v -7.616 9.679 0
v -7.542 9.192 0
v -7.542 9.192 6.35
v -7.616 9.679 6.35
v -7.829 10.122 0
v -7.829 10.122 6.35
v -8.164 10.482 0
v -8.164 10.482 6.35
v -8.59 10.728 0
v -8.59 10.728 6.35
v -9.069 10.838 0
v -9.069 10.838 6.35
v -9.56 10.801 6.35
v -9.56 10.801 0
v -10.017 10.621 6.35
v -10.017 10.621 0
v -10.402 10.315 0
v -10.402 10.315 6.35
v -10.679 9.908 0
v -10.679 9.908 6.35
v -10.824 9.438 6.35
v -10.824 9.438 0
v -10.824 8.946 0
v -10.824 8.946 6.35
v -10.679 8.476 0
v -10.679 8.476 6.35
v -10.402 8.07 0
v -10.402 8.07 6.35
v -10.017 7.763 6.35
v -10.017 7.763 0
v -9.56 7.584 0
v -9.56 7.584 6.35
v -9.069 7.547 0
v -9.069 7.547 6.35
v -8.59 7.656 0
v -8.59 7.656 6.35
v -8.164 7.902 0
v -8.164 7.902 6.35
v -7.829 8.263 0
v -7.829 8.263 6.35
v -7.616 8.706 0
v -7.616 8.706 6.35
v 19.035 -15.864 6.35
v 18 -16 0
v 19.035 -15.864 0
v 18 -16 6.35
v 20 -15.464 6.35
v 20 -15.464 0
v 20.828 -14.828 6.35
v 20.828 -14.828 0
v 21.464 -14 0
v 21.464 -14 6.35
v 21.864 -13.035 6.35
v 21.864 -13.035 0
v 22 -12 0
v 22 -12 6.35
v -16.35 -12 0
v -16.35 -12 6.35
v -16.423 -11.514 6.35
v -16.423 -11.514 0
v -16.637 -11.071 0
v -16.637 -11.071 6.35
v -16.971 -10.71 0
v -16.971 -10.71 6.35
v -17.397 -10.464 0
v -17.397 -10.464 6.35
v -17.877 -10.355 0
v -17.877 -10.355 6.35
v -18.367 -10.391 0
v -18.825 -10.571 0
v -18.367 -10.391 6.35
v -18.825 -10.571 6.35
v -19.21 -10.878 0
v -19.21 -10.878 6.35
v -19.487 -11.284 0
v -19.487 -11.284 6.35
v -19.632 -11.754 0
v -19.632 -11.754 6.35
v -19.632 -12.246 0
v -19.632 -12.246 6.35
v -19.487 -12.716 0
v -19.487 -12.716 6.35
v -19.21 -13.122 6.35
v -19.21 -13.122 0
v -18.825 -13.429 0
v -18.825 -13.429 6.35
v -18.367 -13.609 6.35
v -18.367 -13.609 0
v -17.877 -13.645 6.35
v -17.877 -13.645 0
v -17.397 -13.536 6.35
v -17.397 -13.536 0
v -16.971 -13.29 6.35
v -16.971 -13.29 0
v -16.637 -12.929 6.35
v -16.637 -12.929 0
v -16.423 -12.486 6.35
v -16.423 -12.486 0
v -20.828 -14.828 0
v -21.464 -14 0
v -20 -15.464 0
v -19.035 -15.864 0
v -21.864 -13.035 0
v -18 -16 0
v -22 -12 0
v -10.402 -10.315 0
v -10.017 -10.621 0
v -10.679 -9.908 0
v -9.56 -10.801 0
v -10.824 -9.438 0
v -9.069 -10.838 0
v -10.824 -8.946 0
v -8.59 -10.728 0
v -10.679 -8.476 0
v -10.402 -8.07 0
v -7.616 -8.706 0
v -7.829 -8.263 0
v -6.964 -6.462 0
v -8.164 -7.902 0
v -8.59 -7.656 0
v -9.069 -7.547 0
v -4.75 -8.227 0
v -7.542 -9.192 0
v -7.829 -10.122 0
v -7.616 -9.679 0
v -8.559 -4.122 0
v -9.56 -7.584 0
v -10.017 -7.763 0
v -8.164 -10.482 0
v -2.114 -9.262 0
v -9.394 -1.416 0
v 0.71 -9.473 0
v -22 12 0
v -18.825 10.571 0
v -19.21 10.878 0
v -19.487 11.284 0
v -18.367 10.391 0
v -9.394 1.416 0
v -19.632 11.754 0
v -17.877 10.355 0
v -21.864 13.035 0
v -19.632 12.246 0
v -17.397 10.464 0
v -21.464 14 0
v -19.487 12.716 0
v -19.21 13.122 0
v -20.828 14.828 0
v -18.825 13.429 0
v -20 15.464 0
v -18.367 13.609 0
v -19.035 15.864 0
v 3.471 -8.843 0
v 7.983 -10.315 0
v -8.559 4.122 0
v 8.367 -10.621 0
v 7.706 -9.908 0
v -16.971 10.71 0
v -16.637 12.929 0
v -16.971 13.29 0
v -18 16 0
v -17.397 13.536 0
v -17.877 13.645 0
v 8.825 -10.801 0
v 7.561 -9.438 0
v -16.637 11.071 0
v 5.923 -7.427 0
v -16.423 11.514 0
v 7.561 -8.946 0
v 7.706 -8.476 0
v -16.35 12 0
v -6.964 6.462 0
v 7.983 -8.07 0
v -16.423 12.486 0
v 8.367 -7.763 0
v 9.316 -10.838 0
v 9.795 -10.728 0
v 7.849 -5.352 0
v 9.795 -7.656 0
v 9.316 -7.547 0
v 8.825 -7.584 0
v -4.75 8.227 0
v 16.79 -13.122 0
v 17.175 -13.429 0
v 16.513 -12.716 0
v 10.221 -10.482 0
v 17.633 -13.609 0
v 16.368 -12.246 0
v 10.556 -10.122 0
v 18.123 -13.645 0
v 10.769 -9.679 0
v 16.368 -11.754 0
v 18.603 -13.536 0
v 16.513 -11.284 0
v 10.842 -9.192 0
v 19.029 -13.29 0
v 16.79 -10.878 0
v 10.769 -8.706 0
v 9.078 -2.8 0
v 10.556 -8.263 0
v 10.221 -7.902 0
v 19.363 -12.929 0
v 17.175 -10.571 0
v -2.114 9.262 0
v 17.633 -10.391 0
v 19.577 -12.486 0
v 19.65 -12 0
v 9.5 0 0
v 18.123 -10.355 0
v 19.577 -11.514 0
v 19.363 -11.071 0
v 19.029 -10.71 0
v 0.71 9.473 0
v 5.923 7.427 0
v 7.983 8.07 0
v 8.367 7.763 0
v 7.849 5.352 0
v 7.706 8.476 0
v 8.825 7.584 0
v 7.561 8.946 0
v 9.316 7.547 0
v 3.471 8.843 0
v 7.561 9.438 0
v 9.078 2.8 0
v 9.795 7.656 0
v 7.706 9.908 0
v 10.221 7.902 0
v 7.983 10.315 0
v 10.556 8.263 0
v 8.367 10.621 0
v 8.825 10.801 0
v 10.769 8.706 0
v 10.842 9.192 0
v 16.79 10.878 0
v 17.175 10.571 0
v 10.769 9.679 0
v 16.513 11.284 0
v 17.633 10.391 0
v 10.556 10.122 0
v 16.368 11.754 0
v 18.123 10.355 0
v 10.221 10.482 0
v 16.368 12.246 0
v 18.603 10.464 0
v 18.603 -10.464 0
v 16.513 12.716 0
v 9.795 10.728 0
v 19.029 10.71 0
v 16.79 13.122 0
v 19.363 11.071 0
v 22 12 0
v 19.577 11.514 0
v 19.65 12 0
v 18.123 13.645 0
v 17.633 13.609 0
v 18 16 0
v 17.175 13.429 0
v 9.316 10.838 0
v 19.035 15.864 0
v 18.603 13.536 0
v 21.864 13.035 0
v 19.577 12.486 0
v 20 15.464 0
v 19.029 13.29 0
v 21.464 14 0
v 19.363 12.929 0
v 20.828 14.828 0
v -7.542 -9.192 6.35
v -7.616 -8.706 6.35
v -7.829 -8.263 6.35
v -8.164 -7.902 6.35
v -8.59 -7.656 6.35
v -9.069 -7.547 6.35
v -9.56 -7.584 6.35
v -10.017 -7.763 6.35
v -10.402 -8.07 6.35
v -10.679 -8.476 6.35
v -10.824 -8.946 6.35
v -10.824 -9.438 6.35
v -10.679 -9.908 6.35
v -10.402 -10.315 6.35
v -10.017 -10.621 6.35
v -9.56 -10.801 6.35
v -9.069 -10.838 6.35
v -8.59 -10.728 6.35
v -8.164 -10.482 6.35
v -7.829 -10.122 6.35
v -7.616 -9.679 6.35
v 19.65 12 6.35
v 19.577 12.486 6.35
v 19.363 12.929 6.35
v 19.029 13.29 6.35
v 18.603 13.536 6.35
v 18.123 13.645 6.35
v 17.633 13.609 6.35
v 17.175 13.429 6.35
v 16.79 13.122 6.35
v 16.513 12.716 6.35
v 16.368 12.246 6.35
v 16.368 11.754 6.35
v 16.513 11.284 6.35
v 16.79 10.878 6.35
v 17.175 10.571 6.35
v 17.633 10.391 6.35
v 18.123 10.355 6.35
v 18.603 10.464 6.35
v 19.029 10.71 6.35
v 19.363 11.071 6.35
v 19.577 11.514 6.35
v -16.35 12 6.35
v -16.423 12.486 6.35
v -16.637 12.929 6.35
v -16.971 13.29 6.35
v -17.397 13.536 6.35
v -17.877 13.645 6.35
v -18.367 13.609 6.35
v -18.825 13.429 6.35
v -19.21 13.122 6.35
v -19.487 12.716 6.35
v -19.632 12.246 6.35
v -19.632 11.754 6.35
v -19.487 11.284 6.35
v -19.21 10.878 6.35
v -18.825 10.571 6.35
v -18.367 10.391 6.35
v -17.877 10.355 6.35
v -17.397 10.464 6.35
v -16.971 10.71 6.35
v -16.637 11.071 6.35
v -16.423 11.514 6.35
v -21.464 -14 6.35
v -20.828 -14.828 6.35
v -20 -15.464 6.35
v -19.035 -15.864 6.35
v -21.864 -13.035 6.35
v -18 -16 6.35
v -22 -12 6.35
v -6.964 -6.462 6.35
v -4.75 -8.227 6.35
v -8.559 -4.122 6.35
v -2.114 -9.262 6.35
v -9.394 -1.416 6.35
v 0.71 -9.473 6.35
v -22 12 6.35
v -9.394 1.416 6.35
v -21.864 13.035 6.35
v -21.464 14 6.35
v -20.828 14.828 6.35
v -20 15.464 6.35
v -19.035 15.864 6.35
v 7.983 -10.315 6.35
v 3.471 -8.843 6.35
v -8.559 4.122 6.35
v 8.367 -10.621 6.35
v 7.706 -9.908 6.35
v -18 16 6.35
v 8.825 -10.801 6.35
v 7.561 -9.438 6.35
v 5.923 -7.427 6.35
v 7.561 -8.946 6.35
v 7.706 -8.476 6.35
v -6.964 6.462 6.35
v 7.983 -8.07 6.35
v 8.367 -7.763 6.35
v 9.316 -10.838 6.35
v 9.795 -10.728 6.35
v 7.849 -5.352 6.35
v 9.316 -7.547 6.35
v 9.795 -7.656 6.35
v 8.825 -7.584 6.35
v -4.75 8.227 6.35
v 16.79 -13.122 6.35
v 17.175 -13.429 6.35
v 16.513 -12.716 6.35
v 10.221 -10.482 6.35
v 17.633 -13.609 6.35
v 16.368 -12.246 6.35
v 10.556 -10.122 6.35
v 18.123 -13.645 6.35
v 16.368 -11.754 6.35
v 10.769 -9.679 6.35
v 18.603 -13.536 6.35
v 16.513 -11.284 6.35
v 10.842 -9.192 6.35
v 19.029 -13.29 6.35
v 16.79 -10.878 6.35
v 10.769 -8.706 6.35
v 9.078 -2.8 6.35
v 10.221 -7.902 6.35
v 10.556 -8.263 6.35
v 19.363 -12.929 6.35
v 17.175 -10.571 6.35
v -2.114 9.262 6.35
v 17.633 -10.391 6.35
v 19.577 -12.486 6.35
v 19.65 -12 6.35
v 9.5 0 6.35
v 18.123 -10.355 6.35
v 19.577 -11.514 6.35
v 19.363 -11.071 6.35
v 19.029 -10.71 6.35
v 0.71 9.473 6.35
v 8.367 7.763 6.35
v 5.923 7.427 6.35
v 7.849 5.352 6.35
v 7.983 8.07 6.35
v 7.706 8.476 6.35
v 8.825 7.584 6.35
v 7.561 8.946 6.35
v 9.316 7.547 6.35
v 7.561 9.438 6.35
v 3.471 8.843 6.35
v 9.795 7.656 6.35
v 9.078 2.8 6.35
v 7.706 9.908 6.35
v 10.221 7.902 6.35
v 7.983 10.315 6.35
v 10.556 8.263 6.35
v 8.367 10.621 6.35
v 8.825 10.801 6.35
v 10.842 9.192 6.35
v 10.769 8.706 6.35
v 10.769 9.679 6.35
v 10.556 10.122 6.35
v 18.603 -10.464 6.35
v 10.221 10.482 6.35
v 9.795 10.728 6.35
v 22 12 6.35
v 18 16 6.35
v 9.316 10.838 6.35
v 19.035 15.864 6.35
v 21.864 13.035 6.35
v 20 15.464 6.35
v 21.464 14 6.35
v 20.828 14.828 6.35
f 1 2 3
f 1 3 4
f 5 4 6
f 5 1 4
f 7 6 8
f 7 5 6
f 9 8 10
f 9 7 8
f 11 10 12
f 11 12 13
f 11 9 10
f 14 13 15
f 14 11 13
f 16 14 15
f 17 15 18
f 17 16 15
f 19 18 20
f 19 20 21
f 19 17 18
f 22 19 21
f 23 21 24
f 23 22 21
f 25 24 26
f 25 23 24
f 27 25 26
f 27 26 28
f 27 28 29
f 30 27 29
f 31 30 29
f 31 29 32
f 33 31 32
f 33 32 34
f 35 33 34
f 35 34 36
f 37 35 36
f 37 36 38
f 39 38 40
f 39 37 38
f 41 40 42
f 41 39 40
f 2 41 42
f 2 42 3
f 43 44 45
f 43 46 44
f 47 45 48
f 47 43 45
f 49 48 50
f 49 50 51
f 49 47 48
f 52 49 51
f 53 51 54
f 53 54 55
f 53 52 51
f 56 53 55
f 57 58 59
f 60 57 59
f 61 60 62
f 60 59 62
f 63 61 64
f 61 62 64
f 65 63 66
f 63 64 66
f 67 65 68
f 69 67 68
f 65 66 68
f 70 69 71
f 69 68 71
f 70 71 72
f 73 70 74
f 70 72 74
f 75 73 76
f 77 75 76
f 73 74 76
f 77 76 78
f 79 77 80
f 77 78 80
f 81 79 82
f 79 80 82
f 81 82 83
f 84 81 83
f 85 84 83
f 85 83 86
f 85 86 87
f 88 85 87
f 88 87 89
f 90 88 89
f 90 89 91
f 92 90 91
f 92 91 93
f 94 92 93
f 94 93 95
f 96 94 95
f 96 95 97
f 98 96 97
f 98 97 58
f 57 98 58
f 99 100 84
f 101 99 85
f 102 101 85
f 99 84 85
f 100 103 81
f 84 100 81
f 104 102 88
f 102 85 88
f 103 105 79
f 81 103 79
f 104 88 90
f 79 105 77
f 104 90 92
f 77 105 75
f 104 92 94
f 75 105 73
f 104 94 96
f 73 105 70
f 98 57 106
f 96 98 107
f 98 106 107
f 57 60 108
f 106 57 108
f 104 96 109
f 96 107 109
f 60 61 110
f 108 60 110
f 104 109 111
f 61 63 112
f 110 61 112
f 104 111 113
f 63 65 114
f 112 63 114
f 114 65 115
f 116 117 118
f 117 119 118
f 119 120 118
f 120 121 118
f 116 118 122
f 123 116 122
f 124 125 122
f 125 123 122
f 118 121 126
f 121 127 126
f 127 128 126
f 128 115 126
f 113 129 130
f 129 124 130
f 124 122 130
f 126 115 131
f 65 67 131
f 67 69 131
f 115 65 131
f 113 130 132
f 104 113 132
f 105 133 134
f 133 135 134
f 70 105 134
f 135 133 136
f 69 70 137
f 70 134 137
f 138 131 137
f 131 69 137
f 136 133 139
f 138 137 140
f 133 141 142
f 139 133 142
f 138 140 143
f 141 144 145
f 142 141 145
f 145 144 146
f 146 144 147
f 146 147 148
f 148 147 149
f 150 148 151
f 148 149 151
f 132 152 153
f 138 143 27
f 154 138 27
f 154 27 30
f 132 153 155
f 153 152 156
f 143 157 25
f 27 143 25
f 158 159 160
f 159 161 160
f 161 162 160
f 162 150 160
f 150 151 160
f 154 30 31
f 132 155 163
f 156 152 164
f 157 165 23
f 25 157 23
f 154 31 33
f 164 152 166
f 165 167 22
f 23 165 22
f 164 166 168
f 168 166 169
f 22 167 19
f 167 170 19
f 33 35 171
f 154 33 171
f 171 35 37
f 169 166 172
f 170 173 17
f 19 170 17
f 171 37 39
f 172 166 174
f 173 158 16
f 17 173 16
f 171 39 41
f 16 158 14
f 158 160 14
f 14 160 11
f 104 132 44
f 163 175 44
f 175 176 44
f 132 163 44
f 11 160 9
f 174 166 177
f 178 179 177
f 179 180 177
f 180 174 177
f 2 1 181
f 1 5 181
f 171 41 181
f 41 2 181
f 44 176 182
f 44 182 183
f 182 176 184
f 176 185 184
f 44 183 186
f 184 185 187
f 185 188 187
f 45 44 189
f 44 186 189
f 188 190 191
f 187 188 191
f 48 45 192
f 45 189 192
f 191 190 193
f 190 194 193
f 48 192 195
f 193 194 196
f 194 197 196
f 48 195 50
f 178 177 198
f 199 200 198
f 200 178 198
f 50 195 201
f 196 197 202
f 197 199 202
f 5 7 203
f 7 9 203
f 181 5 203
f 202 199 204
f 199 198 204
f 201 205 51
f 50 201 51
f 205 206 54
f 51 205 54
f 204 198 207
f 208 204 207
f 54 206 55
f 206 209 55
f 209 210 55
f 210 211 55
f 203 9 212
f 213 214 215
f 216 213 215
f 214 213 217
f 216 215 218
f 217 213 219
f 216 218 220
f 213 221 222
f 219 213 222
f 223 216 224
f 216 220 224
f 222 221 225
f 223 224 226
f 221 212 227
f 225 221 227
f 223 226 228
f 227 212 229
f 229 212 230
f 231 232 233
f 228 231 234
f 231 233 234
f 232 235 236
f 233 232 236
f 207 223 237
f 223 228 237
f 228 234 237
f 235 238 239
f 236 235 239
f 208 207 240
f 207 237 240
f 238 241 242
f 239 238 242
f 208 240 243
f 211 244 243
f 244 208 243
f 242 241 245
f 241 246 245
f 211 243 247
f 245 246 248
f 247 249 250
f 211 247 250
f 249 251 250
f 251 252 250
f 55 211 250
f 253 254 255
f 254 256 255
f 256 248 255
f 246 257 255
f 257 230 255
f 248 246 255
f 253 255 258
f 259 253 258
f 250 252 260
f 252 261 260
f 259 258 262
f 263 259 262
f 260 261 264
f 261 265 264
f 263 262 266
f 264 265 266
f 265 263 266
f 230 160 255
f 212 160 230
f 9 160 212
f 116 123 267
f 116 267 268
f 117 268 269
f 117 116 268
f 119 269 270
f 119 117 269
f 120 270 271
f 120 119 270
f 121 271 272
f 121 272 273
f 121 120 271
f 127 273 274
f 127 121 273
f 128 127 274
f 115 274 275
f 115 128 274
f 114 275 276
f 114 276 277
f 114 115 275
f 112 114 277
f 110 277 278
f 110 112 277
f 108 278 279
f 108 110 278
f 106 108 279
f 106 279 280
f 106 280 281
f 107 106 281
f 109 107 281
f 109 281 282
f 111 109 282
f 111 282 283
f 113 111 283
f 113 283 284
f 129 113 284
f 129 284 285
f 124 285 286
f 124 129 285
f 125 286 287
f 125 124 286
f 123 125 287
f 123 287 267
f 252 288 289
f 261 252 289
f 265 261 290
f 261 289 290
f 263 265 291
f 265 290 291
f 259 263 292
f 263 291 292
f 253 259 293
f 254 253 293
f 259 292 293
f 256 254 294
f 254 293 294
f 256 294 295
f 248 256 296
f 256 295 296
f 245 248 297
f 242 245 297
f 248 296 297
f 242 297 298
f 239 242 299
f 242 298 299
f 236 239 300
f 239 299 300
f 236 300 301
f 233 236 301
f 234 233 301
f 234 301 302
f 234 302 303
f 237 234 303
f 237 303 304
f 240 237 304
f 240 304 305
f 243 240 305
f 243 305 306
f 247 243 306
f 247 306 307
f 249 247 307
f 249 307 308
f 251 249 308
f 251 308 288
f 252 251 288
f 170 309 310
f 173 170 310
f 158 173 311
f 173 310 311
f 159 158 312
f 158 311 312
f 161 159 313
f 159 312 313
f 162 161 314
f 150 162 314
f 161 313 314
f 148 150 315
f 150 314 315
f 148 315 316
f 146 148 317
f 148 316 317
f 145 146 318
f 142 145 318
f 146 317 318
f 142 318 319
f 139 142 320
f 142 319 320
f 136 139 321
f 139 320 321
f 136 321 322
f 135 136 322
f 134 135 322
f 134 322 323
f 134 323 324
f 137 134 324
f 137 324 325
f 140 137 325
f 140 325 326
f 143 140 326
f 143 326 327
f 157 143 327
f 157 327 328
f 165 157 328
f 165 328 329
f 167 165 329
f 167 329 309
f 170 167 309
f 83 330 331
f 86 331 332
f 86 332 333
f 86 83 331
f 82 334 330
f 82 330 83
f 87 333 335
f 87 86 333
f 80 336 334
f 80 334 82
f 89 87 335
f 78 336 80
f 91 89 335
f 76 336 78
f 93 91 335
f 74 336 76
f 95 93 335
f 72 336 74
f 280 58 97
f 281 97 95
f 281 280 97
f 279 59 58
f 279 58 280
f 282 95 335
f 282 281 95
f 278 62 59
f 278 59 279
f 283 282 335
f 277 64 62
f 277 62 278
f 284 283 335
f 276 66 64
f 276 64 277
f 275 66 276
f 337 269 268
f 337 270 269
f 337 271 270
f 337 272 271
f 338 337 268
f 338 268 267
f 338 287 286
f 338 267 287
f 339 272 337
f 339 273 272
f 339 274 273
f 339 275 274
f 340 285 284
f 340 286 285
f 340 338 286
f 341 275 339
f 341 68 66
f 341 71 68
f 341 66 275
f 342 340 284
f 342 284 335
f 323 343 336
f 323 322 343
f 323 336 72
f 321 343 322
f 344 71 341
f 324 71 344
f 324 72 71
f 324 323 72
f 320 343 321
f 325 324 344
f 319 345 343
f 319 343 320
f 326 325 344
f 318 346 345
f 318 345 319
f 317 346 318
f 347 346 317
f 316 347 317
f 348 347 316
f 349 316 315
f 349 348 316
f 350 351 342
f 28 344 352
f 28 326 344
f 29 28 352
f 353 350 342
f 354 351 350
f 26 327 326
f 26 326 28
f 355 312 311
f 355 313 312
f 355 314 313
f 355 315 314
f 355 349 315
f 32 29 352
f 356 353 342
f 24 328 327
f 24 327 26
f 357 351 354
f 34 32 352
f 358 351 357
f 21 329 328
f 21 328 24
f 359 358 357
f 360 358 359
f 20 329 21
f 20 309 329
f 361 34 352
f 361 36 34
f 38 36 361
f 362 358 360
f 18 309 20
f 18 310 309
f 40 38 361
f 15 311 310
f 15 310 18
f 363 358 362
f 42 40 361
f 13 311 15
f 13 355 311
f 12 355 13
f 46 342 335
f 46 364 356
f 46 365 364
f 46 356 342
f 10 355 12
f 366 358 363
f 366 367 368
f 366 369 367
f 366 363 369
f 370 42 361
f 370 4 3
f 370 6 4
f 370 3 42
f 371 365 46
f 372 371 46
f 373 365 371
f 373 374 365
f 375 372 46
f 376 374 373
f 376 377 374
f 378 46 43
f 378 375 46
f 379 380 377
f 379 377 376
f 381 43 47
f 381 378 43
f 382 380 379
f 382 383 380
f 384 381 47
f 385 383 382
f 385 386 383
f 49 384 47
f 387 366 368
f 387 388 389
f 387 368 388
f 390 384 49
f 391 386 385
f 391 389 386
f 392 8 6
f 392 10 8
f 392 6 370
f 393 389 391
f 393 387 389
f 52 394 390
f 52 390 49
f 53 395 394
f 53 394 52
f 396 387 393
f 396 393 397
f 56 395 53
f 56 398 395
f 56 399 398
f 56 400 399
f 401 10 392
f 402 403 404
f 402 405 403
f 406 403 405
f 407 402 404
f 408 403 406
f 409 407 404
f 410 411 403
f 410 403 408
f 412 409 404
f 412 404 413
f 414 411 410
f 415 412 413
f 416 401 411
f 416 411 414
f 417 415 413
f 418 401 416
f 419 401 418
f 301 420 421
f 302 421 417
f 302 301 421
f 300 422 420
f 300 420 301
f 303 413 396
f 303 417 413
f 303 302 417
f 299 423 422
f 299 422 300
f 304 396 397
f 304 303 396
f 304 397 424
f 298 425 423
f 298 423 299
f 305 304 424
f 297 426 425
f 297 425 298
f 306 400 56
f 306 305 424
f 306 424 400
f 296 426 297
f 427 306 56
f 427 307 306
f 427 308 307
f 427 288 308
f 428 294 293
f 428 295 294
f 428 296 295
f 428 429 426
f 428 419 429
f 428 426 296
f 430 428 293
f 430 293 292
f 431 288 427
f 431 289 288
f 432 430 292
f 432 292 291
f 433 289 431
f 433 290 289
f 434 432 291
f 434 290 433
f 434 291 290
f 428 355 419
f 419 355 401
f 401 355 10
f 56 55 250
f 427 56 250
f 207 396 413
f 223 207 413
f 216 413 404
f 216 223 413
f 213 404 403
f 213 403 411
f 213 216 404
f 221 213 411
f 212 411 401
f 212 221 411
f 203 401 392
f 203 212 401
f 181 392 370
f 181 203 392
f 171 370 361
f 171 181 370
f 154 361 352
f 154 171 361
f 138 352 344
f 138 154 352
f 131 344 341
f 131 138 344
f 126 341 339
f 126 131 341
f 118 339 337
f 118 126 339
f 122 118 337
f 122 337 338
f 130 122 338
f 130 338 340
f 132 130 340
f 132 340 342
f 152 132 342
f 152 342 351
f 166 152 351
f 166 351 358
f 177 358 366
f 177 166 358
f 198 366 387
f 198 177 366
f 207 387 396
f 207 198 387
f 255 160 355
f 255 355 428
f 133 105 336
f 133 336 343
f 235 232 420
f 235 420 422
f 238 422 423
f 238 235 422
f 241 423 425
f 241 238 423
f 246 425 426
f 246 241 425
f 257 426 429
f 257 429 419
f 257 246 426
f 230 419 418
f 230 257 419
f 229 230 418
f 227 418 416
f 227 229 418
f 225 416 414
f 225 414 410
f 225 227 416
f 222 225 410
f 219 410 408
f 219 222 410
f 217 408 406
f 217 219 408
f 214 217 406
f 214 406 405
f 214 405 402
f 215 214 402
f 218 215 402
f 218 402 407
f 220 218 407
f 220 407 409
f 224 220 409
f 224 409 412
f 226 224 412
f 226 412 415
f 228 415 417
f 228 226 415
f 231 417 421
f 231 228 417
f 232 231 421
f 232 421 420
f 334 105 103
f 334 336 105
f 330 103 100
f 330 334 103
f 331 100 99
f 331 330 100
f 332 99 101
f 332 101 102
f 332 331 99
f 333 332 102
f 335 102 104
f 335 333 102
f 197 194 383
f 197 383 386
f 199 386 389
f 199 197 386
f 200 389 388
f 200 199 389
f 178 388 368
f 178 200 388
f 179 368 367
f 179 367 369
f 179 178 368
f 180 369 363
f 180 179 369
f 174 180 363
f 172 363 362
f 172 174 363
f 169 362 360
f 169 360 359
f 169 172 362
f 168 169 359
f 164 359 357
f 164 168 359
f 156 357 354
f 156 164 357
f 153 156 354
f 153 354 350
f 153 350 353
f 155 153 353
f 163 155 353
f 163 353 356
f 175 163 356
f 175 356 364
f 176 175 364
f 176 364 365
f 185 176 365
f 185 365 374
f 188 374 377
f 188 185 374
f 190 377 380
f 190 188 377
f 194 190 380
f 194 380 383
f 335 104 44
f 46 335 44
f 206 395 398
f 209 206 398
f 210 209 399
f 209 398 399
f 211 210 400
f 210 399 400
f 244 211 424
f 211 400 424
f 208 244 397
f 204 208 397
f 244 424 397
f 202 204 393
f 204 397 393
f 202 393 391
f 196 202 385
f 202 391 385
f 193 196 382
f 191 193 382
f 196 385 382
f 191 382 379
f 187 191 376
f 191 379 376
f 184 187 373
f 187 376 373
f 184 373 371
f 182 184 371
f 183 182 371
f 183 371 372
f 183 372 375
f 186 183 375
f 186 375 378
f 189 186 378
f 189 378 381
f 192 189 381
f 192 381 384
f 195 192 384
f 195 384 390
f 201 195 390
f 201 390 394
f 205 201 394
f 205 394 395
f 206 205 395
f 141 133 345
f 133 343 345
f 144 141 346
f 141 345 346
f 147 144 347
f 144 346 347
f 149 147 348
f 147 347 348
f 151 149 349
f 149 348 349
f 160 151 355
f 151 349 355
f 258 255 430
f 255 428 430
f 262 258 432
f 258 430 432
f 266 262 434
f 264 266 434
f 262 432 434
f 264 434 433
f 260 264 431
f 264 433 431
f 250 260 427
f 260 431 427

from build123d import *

# Parameters (mm, degrees)
SKETCH1_W           = 44
SKETCH1_H           = 32
SKETCH1_R           = 9.5
SKETCH1_R_2         = 1.65
BOSS_EXTRUDE1_DEPTH = 6.35
SKETCH2_R           = 1.65
CUT_EXTRUDE1_DEPTH  = 28.934253167
FILLET1_R           = 4


with BuildPart() as part:
    # Sketch1 → Boss-Extrude1 (new body)
    with BuildSketch(Plane.XY):
        Rectangle(SKETCH1_W, SKETCH1_H)
        Circle(SKETCH1_R, mode=Mode.SUBTRACT)
        with Locations((-9.192388155, 9.192388155)):
            Circle(SKETCH1_R_2, mode=Mode.SUBTRACT)
        with Locations((9.192388155, 9.192388155)):
            Circle(SKETCH1_R_2, mode=Mode.SUBTRACT)
        with Locations((9.192388155, -9.192388155)):
            Circle(SKETCH1_R_2, mode=Mode.SUBTRACT)
        with Locations((-9.192388155, -9.192388155)):
            Circle(SKETCH1_R_2, mode=Mode.SUBTRACT)
    extrude(amount=BOSS_EXTRUDE1_DEPTH)

    # Sketch2 → Cut-Extrude1 (cut, through all)
    with BuildSketch(Plane.XY.offset(6.35)):
        with Locations((-18, 12)):
            Circle(SKETCH2_R)
        with Locations((-18, -12)):
            Circle(SKETCH2_R)
        with Locations((18, -12)):
            Circle(SKETCH2_R)
        with Locations((18, 12)):
            Circle(SKETCH2_R)
    extrude(amount=-CUT_EXTRUDE1_DEPTH, mode=Mode.SUBTRACT)

    # Fillet1
    fillet1_edges = [part.edges().sort_by_distance(p)[0] for p in [
        (-22, 16, 3.175),
        (22, 16, 3.175),
        (22, -16, 3.175),
        (-22, -16, 3.175),
    ]]
    fillet(fillet1_edges, radius=FILLET1_R)


solid = part.part
